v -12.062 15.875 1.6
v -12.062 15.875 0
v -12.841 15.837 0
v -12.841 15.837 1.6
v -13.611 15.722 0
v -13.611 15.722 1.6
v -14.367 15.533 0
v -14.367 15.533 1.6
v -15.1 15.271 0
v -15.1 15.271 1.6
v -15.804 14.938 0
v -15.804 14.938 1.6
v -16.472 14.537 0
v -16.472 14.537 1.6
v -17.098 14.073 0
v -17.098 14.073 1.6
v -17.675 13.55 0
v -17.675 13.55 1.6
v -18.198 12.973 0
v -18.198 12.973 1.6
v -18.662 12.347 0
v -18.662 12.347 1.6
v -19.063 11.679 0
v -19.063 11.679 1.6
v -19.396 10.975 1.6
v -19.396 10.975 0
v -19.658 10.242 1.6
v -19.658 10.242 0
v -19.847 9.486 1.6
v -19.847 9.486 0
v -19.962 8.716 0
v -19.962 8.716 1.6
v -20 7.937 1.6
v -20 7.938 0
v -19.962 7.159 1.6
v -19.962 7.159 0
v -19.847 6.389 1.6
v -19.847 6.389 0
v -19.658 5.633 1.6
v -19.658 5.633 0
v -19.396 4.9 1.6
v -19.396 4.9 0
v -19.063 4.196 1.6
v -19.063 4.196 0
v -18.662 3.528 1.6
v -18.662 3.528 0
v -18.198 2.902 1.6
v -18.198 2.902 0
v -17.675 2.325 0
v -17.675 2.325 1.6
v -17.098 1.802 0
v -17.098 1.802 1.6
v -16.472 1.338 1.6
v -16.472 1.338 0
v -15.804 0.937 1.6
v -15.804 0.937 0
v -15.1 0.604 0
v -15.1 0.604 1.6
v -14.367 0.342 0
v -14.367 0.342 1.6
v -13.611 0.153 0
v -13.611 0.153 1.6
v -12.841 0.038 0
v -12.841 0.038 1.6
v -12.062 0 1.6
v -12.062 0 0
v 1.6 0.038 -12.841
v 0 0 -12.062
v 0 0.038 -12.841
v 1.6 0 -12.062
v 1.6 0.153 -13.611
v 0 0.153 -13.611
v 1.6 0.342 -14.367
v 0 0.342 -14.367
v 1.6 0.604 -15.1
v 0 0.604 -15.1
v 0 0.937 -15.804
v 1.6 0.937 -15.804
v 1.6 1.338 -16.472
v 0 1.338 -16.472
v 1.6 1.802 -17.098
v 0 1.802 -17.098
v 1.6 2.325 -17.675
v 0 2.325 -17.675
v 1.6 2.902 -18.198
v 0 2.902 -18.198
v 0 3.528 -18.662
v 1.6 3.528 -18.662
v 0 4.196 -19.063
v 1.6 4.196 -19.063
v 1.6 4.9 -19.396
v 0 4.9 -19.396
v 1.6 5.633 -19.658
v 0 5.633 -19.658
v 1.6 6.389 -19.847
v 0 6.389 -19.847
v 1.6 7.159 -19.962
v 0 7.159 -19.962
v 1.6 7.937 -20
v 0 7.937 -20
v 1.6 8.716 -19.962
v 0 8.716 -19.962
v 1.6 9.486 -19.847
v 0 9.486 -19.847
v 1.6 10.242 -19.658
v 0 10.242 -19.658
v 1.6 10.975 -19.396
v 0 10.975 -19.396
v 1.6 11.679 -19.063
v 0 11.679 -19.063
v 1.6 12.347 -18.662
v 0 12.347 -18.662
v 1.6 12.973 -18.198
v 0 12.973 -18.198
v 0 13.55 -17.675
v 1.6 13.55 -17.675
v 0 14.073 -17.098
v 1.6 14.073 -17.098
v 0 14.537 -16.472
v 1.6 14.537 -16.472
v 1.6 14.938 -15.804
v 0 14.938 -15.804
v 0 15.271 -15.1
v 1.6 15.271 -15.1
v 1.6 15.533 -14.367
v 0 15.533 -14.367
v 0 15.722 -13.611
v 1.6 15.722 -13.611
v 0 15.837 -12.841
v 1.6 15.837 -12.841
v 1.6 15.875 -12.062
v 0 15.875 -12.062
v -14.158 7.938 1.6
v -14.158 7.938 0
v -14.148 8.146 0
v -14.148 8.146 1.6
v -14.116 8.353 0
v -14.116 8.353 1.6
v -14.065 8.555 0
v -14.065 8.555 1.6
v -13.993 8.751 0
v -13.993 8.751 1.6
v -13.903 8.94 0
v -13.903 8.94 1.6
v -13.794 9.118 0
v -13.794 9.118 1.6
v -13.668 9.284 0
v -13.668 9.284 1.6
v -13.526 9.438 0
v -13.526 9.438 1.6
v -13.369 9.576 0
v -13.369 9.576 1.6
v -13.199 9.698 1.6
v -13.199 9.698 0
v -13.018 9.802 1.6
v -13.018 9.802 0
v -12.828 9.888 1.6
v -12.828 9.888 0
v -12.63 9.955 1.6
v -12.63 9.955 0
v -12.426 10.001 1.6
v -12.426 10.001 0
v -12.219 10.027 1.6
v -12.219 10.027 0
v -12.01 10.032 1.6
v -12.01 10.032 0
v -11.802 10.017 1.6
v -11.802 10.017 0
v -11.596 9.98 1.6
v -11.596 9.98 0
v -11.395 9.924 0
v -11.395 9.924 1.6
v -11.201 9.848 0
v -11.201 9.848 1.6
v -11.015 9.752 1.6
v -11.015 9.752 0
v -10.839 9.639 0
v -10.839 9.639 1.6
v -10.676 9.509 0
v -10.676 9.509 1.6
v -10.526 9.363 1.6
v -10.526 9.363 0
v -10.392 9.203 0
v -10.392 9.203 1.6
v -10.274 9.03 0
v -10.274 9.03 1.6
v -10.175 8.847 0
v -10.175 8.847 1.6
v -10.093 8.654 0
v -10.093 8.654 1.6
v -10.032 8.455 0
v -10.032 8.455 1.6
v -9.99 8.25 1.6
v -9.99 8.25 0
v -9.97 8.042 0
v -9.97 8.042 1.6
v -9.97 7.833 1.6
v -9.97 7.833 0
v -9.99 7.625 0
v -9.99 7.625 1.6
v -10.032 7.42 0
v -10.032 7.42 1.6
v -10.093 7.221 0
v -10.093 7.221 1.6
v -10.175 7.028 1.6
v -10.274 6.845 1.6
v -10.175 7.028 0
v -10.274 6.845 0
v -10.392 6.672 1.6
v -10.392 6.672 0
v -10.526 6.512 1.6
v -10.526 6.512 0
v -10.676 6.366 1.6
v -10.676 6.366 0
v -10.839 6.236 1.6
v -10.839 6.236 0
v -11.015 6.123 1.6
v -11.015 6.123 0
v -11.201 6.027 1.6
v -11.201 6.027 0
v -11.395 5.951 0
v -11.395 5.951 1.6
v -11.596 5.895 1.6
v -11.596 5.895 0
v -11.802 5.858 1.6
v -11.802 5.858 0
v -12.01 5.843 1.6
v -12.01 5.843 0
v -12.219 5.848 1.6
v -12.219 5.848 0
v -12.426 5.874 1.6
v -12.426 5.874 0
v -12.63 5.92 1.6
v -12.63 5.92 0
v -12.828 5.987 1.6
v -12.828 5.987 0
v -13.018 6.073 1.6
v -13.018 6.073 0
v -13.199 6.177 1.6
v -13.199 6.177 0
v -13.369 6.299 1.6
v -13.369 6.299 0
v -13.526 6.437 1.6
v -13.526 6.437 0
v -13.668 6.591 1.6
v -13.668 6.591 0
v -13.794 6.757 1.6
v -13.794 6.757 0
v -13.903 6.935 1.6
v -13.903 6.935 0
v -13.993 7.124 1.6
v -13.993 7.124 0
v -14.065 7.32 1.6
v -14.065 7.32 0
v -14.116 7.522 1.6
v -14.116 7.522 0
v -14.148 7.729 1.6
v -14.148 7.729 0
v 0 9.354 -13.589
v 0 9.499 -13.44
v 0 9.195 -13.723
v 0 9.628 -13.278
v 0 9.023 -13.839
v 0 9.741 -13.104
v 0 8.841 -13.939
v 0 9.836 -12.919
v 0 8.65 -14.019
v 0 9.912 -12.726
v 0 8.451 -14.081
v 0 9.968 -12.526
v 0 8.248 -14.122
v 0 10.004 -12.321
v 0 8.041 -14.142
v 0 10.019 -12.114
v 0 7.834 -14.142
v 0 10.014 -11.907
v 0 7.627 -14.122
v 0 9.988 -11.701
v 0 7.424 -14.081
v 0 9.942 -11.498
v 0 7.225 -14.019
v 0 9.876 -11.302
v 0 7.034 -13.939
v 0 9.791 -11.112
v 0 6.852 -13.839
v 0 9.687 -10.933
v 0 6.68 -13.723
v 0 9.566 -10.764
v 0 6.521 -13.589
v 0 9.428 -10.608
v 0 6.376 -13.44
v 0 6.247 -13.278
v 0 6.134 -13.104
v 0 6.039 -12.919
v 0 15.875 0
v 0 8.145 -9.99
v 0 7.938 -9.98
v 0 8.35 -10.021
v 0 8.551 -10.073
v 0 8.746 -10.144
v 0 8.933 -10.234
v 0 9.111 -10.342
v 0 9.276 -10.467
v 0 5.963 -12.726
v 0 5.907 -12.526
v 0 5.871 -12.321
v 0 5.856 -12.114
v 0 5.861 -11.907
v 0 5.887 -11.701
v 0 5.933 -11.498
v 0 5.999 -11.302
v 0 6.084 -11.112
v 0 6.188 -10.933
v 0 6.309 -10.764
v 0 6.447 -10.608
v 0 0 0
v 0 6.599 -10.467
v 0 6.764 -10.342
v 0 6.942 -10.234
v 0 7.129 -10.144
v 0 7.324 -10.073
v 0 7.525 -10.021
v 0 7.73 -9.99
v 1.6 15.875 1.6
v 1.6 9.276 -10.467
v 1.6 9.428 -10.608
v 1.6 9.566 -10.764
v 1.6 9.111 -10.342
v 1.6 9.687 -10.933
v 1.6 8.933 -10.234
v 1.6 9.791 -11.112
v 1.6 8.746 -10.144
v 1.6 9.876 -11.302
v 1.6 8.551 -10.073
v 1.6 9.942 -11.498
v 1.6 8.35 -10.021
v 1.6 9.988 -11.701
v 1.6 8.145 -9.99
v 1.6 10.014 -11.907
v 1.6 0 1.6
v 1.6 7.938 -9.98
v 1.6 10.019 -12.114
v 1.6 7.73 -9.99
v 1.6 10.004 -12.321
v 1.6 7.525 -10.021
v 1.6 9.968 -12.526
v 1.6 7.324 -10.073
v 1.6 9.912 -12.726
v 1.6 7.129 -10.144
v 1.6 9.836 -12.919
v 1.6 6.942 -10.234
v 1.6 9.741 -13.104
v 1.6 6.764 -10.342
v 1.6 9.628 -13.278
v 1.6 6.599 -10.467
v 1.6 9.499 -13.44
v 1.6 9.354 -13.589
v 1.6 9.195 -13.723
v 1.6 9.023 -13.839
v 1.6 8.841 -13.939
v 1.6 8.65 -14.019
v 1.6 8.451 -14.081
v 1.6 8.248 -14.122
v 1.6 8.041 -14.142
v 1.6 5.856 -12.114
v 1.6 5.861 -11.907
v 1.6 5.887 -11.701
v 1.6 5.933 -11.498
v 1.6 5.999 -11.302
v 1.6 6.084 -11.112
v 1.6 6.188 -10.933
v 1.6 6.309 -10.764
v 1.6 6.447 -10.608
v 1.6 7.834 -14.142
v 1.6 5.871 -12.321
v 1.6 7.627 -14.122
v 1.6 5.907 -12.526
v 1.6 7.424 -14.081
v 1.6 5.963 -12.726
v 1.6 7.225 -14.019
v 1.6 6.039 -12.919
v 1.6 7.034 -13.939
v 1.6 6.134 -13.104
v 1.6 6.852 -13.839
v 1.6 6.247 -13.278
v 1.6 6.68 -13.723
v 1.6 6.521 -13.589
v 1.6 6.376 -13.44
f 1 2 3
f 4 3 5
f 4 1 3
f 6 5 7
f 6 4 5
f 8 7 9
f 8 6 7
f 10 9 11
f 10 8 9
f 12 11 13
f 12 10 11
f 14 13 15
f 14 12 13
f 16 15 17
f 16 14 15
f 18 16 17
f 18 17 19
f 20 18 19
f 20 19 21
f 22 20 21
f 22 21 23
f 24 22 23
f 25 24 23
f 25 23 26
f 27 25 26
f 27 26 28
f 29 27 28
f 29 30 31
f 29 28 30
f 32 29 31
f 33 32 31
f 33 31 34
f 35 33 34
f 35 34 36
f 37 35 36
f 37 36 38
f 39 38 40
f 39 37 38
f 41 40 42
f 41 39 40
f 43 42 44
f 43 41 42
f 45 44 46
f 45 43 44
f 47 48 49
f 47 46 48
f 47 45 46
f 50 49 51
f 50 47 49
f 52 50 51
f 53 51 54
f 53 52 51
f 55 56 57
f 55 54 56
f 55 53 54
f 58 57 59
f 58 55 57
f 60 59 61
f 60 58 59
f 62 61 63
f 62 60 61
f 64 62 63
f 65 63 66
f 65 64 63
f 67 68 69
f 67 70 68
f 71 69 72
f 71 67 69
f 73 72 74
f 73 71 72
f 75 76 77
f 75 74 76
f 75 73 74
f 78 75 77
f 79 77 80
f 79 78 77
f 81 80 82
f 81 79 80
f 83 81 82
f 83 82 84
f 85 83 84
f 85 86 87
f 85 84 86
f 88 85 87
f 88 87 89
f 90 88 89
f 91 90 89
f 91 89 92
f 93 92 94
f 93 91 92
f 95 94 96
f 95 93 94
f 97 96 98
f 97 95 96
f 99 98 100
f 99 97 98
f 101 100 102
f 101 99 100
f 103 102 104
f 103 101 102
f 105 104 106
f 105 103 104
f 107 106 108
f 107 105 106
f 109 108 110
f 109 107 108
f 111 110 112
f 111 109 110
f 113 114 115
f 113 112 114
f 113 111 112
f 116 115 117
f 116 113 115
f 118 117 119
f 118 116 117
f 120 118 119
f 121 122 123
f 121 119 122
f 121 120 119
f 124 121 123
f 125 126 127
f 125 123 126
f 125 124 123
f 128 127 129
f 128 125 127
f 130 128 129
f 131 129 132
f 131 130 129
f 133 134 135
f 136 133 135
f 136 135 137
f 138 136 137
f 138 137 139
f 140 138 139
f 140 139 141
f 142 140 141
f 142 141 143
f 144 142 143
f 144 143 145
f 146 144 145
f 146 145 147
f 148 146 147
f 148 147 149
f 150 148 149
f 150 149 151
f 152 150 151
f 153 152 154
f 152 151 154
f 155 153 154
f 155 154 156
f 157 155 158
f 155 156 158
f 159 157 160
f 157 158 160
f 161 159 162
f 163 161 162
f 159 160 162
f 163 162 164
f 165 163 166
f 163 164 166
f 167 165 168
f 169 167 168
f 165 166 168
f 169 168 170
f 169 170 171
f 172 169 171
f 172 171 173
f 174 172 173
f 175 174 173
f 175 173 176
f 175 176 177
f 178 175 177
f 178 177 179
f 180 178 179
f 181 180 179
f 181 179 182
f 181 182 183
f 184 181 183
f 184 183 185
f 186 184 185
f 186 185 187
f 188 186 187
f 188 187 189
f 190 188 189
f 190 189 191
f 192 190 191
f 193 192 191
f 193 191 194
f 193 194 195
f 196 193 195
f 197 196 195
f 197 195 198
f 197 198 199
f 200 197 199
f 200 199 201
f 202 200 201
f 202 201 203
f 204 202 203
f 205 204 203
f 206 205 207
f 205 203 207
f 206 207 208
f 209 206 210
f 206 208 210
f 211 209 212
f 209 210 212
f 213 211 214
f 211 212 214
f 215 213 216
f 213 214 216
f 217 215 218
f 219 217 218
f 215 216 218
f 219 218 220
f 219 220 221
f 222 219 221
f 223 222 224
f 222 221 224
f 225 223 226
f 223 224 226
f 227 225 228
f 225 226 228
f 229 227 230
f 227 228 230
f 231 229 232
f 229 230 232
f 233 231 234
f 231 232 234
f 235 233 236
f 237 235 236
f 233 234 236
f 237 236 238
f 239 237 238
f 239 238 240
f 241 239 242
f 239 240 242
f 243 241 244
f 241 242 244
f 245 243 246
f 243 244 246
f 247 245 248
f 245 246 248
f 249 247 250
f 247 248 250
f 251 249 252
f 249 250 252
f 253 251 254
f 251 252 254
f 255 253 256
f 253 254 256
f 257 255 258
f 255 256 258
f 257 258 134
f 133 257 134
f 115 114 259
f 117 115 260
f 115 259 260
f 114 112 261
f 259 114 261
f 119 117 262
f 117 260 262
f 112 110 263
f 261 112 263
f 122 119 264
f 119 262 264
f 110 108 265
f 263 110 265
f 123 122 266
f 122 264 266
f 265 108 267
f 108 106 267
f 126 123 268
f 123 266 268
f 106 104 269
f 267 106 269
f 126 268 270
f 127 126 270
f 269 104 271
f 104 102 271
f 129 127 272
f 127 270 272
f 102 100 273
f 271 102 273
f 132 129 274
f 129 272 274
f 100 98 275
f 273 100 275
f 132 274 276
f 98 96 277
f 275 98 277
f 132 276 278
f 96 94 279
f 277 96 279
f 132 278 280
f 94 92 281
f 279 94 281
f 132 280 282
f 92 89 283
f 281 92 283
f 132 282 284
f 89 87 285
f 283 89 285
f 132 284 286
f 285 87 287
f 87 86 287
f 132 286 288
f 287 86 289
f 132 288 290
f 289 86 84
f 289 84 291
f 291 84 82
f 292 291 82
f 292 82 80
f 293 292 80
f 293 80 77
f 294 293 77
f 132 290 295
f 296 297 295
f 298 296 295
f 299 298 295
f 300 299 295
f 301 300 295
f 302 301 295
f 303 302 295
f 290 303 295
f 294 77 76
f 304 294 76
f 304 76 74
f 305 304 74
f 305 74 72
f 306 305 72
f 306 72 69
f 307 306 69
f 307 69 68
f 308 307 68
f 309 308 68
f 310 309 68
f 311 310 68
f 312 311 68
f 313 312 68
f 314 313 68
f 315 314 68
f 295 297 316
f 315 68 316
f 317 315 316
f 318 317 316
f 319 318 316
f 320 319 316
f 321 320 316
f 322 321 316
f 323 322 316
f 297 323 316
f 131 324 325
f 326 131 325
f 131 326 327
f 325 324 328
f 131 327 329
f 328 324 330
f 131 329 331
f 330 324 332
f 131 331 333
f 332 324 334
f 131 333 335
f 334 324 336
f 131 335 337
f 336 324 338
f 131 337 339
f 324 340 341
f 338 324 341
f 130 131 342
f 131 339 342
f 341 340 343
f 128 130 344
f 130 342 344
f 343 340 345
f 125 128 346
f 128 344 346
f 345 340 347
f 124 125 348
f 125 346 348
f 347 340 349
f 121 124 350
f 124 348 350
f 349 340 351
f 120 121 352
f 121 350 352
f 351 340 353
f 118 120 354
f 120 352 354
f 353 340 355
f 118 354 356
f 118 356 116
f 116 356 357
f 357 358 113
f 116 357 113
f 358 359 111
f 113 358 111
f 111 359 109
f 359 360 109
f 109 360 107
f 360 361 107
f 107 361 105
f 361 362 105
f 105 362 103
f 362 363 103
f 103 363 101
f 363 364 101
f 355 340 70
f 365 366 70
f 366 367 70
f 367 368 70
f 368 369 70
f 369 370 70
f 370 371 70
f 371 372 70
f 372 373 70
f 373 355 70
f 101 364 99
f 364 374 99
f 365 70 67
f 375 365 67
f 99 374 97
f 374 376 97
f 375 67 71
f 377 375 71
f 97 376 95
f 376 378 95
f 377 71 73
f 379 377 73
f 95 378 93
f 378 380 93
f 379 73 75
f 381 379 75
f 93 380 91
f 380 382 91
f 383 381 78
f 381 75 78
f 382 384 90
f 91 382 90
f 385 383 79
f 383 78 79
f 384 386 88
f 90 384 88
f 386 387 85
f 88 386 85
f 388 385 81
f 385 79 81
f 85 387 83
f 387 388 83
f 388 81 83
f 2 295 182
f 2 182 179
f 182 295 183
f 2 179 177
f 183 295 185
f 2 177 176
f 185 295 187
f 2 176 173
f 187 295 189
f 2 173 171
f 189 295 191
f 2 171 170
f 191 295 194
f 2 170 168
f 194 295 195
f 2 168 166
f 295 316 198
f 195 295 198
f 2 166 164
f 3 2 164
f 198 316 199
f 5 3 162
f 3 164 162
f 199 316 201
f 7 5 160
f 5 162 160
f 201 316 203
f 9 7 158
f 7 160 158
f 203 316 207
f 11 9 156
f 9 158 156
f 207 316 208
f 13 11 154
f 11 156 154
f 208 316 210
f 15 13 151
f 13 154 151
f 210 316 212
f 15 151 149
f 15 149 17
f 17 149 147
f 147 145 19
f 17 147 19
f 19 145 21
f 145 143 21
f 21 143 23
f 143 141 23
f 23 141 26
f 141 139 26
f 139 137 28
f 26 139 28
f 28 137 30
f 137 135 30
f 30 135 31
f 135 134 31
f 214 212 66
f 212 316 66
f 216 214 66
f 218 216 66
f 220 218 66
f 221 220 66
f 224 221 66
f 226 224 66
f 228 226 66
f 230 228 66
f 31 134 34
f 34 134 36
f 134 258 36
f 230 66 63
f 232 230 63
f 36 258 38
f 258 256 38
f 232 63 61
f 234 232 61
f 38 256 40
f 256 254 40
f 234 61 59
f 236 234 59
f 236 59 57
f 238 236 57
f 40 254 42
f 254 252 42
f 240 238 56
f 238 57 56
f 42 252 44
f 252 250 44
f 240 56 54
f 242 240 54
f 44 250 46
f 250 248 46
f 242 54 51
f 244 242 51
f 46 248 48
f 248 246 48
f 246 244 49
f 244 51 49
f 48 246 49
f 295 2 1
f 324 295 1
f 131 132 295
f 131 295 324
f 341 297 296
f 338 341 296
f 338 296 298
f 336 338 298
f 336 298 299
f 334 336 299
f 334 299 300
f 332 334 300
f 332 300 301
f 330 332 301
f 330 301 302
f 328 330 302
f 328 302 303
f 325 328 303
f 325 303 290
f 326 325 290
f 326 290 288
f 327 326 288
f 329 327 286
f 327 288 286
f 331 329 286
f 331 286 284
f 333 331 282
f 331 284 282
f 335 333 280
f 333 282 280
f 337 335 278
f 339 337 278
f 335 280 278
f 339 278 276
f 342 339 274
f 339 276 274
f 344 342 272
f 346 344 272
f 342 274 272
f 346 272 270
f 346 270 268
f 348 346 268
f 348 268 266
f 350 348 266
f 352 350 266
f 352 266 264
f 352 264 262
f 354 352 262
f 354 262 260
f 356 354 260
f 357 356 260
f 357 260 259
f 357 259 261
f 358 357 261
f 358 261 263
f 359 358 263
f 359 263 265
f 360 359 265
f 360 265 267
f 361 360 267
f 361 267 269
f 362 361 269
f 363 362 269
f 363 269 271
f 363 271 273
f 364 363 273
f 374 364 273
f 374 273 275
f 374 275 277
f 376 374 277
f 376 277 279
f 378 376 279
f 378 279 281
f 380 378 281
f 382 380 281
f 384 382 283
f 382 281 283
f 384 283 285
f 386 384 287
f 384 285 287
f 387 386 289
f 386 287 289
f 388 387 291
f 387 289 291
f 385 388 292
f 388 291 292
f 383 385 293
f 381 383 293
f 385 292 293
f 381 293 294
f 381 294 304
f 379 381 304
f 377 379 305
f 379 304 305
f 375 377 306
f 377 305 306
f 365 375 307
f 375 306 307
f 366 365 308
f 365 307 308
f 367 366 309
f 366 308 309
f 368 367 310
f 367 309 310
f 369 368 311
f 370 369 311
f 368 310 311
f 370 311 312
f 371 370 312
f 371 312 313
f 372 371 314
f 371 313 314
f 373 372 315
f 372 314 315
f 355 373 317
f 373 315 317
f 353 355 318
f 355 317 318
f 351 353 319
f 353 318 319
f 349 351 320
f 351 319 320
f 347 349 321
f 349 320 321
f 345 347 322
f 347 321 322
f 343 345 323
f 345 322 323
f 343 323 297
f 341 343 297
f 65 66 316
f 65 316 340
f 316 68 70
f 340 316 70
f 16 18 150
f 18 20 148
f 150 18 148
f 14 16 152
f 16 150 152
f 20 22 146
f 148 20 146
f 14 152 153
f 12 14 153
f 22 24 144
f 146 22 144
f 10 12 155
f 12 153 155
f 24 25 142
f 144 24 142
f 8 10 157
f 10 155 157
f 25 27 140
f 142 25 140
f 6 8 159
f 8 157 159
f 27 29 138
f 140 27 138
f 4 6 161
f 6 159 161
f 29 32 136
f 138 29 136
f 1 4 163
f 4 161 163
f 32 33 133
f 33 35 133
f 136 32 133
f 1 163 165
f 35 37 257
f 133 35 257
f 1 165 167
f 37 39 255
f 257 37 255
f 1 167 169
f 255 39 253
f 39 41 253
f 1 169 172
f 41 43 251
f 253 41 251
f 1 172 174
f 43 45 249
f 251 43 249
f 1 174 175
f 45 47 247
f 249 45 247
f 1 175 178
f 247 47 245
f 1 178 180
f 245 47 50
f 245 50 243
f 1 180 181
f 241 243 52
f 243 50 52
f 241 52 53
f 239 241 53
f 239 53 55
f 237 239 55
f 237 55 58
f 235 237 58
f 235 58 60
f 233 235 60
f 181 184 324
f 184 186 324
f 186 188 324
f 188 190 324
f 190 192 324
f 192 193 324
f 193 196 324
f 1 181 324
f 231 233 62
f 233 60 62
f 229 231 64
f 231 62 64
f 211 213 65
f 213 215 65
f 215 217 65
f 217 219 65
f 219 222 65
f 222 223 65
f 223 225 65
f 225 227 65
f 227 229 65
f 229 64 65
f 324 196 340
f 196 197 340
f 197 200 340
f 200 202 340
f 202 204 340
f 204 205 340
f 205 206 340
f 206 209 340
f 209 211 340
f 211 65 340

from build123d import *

# Parameters (mm, degrees)
EXTRUDE_THIN1_DEPTH = 15.875
FILLET1_RADIUS      = 7.9375
FILLET1_LENGTH      = 1.6
FILLET2_RADIUS      = 7.9375
FILLET2_LENGTH      = 1.6
SKETCH2_R           = 2.0825
CUT_EXTRUDE1_DEPTH  = 10
SKETCH3_R           = 2.0955
CUT_EXTRUDE2_DEPTH  = 10


with BuildPart() as part:
    # Sketch1 → Extrude-Thin1 (new body)
    with BuildSketch(Plane(origin=(0, 0, 0), x_dir=(1, 0, 0), z_dir=(0, 1, 0))):
        Polygon((0, 20), (0, 0), (-20, 0), (-20, -1.6), (1.6, -1.6), (1.6, 20), align=None)
    extrude(amount=EXTRUDE_THIN1_DEPTH)

    # Fillet1: full round fillet: the end face becomes a half cylinder, R = half its width
    fillet1_face = Plane((0.8, 7.9375, -20), x_dir=(1, 0, 0), z_dir=(0, 0, -1))  # on the end face: x along it, z out of the body
    fillet1_slab = fillet1_face.offset(-FILLET1_RADIUS / 2) * Box(FILLET1_LENGTH, 2 * FILLET1_RADIUS, FILLET1_RADIUS, mode=Mode.PRIVATE)  # the body's end, R deep
    fillet1_round = Plane((0.8, 7.9375, -12.0625), x_dir=(0, 0, -1), z_dir=(1, 0, 0)) * Cylinder(FILLET1_RADIUS, FILLET1_LENGTH, mode=Mode.PRIVATE)  # its axis R under the face
    add(fillet1_slab - fillet1_round, mode=Mode.SUBTRACT)

    # Fillet2: full round fillet: the end face becomes a half cylinder, R = half its width
    fillet2_face = Plane((-20, 7.9375, 0.8), x_dir=(0, 0, 1), z_dir=(-1, 0, 0))  # on the end face: x along it, z out of the body
    fillet2_slab = fillet2_face.offset(-FILLET2_RADIUS / 2) * Box(FILLET2_LENGTH, 2 * FILLET2_RADIUS, FILLET2_RADIUS, mode=Mode.PRIVATE)  # the body's end, R deep
    fillet2_round = Plane((-12.0625, 7.9375, 0.8), x_dir=(-1, 0, 0), z_dir=(0, 0, 1)) * Cylinder(FILLET2_RADIUS, FILLET2_LENGTH, mode=Mode.PRIVATE)  # its axis R under the face
    add(fillet2_slab - fillet2_round, mode=Mode.SUBTRACT)

    # Sketch2 → Cut-Extrude1 (cut)
    with BuildSketch(Plane.ZY):
        with Locations((-12.0625, 7.9375)):
            Circle(SKETCH2_R)
    extrude(amount=-CUT_EXTRUDE1_DEPTH, mode=Mode.SUBTRACT)

    # Sketch3 → Cut-Extrude2 (cut)
    with BuildSketch(Plane(origin=(0, 0, 0), x_dir=(-1, 0, 0), z_dir=(0, 0, -1))):
        with Locations((12.0625, 7.9375)):
            Circle(SKETCH3_R)
    extrude(amount=-CUT_EXTRUDE2_DEPTH, mode=Mode.SUBTRACT)


solid = part.part
